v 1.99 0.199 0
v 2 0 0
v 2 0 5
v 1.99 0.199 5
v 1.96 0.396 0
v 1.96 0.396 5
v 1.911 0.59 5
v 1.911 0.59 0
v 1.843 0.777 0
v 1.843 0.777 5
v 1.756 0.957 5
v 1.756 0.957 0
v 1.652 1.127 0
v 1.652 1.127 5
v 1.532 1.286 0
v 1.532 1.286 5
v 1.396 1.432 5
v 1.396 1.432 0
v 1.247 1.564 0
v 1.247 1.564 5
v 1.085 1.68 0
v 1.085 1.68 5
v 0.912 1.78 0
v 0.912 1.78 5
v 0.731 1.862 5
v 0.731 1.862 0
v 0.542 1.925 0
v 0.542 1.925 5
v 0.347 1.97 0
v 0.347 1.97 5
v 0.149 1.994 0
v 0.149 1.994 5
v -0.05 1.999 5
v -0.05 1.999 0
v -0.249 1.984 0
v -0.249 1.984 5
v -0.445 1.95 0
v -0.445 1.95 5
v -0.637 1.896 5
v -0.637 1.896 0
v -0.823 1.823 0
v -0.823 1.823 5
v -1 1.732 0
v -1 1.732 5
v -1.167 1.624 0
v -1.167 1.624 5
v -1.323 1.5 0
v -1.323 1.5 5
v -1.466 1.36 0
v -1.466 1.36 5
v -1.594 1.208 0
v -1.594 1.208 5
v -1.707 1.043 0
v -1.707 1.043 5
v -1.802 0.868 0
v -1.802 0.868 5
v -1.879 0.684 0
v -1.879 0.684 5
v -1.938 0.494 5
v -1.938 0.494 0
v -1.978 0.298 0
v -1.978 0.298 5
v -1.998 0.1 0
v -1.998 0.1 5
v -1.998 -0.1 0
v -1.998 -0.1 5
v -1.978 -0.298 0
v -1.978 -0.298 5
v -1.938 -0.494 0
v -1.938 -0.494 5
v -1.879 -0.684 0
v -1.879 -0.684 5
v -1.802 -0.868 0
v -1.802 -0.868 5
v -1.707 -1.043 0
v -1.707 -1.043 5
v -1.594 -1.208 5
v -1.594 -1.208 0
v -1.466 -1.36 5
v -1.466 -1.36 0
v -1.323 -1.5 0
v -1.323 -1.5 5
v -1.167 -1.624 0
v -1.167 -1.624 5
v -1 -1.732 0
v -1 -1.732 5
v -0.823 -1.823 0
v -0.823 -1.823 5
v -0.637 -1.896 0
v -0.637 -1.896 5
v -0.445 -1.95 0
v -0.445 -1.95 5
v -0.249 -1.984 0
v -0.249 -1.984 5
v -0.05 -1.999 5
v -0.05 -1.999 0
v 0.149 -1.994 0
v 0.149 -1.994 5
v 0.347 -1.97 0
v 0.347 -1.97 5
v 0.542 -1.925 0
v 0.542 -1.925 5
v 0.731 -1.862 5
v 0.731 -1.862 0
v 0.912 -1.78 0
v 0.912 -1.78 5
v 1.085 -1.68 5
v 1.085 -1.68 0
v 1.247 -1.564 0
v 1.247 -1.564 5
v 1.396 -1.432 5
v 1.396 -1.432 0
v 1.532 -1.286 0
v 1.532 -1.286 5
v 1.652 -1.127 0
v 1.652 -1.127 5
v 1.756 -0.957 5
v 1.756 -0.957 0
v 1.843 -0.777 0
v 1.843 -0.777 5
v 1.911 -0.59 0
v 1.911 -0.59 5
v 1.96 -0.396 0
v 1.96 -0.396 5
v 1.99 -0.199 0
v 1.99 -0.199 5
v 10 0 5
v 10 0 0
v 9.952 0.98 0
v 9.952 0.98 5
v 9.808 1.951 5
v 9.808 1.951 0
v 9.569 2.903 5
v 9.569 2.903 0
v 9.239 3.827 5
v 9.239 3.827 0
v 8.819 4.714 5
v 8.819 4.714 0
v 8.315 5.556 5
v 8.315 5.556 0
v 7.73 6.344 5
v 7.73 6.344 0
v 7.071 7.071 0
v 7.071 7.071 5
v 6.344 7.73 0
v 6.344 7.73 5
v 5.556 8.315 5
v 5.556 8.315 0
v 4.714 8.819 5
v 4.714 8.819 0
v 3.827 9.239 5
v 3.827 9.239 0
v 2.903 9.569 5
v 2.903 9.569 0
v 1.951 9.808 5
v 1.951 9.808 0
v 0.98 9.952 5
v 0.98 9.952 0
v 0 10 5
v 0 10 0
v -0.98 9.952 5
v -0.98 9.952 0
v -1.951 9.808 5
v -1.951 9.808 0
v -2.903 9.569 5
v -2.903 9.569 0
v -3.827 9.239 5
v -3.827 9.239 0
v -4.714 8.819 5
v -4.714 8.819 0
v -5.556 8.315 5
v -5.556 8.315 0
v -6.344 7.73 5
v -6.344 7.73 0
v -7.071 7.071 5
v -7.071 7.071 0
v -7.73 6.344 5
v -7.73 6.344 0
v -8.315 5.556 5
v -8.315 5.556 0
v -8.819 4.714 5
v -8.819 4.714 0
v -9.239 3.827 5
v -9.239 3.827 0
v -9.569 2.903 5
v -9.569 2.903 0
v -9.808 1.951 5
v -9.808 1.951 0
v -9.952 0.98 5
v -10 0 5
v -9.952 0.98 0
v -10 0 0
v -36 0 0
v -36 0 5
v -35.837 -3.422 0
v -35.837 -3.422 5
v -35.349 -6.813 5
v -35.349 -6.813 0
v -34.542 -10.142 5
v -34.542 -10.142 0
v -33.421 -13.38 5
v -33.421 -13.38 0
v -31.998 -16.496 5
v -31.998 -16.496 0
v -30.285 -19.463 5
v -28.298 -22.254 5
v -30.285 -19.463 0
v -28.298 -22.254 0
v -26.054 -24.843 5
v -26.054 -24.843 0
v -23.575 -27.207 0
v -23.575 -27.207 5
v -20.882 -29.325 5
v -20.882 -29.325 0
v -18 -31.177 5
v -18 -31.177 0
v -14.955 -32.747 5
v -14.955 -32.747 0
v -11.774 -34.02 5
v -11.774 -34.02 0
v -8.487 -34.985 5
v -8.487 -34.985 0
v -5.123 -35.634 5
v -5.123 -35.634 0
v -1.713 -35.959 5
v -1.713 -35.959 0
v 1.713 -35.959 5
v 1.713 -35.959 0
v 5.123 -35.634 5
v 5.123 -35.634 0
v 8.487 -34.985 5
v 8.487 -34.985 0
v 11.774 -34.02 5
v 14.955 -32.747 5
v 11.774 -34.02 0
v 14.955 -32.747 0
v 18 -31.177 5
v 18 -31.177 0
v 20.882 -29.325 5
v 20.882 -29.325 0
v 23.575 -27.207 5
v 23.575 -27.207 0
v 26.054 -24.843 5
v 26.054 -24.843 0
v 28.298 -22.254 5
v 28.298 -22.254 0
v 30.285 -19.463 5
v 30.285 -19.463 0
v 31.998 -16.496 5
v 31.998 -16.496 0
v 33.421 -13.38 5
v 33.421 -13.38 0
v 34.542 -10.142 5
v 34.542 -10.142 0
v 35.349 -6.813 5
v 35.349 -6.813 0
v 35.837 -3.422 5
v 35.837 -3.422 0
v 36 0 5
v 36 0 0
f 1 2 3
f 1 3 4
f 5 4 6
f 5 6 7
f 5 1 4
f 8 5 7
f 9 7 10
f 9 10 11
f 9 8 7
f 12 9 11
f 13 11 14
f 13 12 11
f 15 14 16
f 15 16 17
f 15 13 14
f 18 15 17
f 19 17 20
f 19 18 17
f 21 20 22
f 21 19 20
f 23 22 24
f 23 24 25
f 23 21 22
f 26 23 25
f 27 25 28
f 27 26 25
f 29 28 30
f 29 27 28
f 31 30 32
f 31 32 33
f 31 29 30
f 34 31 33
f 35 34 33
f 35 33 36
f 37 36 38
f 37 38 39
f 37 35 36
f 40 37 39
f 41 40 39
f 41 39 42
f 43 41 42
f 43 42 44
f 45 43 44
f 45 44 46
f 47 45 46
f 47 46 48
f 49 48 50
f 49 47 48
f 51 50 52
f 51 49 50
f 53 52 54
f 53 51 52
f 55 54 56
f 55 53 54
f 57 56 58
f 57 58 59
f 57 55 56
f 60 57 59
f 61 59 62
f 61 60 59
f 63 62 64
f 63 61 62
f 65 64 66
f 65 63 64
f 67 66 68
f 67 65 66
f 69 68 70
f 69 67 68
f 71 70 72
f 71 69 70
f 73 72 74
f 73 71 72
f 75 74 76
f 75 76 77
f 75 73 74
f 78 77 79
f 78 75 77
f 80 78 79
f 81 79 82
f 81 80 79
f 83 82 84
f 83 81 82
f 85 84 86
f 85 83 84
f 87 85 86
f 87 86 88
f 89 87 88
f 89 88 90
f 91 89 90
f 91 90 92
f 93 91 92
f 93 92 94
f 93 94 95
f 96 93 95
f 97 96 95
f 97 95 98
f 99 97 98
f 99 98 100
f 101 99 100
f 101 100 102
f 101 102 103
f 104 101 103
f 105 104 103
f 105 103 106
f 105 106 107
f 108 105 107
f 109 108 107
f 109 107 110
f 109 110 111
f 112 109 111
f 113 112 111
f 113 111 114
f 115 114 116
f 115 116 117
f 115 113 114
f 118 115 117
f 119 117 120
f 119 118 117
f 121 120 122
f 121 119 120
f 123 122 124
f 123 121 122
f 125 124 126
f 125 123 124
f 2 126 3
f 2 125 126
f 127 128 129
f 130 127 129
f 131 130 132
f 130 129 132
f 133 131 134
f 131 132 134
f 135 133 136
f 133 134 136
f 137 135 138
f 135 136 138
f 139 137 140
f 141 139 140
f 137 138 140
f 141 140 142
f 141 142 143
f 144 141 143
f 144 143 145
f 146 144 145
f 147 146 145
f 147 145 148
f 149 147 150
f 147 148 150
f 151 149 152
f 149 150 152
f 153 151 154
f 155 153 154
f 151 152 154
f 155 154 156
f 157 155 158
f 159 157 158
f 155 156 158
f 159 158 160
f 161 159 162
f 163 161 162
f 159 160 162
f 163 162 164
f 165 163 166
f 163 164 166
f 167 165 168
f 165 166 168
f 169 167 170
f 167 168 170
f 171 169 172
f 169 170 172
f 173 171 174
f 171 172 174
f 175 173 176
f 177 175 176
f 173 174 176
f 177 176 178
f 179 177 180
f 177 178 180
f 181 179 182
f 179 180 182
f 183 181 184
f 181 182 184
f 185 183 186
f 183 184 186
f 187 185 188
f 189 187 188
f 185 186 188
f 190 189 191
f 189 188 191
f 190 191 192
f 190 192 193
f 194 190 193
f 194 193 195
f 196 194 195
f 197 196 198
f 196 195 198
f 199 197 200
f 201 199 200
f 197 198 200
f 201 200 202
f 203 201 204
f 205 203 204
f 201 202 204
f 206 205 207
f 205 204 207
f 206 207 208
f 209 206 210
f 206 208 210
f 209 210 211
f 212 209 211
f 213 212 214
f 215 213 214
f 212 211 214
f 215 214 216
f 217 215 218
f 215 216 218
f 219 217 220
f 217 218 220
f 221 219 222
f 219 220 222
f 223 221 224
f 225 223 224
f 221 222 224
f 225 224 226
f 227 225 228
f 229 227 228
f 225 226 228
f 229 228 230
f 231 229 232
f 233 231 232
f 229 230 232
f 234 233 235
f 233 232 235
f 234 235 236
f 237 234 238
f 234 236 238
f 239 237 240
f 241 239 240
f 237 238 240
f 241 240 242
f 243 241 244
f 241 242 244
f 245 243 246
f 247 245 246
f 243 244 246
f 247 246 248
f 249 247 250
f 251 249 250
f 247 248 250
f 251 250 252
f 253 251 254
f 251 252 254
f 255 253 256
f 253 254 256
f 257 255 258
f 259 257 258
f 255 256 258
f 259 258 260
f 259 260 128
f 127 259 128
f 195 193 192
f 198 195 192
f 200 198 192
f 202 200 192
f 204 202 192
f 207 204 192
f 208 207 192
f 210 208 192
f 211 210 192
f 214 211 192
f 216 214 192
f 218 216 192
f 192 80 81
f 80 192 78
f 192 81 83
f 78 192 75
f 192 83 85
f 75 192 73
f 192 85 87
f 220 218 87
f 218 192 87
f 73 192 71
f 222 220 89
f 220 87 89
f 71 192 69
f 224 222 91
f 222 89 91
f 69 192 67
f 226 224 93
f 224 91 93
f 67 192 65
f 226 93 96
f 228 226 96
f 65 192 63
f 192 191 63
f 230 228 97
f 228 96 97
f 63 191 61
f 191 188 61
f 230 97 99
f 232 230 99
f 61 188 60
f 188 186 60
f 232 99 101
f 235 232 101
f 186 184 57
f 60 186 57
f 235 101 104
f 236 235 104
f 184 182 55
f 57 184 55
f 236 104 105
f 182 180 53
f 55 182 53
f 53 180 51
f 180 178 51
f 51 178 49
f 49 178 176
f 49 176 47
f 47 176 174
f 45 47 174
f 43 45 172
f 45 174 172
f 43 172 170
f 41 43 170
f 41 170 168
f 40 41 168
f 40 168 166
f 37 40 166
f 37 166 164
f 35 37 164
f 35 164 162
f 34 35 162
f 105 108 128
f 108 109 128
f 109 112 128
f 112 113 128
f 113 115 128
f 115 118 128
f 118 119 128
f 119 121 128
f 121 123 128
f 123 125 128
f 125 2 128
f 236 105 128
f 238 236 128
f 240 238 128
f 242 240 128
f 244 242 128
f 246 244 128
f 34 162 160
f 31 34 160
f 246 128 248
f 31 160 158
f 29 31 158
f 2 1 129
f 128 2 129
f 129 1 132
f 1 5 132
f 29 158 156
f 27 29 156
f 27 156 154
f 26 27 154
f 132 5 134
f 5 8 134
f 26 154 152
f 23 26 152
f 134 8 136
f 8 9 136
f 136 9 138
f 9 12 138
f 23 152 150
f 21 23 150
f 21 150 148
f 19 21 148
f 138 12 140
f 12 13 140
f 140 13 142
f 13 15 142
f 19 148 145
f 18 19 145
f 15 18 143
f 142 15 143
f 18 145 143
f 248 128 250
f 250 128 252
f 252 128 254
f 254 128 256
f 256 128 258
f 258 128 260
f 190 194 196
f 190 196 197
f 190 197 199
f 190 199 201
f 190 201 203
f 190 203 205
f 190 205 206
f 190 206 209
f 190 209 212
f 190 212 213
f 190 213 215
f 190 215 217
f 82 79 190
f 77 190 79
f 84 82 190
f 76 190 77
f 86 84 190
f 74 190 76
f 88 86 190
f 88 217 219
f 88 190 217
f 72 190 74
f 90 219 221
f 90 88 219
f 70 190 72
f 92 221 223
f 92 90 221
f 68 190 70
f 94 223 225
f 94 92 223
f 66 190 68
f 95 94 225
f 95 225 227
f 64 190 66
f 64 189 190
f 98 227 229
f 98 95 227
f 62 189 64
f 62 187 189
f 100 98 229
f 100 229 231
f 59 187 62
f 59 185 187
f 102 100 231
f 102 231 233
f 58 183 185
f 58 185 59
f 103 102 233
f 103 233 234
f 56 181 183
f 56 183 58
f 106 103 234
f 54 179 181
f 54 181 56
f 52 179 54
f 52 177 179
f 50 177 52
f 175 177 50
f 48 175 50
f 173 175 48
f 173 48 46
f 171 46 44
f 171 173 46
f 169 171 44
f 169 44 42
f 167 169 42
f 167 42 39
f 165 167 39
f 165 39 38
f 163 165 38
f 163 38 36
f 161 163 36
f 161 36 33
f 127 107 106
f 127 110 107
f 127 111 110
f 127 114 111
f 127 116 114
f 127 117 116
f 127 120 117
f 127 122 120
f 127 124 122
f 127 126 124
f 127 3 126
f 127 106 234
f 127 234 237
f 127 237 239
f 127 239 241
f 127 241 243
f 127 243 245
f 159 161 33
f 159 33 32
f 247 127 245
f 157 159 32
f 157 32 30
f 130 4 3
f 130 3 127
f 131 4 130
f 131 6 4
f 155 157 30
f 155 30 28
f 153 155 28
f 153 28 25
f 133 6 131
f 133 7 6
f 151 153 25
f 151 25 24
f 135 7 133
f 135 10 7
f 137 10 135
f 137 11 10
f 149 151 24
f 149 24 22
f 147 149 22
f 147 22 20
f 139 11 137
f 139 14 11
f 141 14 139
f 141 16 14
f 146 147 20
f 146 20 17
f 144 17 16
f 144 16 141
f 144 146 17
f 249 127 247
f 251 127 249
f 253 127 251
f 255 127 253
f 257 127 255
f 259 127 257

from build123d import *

# Parameters (mm, degrees)
F0_R     = 2
F1_DEPTH = 5


with BuildPart() as f1:
    # F0 (on Top) → F1 (new body)
    with BuildSketch(Plane.XY):
        with BuildLine():
            ThreePointArc((10, 0), (0, 10), (-10, 0))
            Line((-10, 0), (-36, 0))
            ThreePointArc((-36, 0), (0, -36), (36, 0))
            Line((36, 0), (10, 0))
        make_face()
        Circle(F0_R, mode=Mode.SUBTRACT)
    extrude(amount=F1_DEPTH)


solid = f1.part
